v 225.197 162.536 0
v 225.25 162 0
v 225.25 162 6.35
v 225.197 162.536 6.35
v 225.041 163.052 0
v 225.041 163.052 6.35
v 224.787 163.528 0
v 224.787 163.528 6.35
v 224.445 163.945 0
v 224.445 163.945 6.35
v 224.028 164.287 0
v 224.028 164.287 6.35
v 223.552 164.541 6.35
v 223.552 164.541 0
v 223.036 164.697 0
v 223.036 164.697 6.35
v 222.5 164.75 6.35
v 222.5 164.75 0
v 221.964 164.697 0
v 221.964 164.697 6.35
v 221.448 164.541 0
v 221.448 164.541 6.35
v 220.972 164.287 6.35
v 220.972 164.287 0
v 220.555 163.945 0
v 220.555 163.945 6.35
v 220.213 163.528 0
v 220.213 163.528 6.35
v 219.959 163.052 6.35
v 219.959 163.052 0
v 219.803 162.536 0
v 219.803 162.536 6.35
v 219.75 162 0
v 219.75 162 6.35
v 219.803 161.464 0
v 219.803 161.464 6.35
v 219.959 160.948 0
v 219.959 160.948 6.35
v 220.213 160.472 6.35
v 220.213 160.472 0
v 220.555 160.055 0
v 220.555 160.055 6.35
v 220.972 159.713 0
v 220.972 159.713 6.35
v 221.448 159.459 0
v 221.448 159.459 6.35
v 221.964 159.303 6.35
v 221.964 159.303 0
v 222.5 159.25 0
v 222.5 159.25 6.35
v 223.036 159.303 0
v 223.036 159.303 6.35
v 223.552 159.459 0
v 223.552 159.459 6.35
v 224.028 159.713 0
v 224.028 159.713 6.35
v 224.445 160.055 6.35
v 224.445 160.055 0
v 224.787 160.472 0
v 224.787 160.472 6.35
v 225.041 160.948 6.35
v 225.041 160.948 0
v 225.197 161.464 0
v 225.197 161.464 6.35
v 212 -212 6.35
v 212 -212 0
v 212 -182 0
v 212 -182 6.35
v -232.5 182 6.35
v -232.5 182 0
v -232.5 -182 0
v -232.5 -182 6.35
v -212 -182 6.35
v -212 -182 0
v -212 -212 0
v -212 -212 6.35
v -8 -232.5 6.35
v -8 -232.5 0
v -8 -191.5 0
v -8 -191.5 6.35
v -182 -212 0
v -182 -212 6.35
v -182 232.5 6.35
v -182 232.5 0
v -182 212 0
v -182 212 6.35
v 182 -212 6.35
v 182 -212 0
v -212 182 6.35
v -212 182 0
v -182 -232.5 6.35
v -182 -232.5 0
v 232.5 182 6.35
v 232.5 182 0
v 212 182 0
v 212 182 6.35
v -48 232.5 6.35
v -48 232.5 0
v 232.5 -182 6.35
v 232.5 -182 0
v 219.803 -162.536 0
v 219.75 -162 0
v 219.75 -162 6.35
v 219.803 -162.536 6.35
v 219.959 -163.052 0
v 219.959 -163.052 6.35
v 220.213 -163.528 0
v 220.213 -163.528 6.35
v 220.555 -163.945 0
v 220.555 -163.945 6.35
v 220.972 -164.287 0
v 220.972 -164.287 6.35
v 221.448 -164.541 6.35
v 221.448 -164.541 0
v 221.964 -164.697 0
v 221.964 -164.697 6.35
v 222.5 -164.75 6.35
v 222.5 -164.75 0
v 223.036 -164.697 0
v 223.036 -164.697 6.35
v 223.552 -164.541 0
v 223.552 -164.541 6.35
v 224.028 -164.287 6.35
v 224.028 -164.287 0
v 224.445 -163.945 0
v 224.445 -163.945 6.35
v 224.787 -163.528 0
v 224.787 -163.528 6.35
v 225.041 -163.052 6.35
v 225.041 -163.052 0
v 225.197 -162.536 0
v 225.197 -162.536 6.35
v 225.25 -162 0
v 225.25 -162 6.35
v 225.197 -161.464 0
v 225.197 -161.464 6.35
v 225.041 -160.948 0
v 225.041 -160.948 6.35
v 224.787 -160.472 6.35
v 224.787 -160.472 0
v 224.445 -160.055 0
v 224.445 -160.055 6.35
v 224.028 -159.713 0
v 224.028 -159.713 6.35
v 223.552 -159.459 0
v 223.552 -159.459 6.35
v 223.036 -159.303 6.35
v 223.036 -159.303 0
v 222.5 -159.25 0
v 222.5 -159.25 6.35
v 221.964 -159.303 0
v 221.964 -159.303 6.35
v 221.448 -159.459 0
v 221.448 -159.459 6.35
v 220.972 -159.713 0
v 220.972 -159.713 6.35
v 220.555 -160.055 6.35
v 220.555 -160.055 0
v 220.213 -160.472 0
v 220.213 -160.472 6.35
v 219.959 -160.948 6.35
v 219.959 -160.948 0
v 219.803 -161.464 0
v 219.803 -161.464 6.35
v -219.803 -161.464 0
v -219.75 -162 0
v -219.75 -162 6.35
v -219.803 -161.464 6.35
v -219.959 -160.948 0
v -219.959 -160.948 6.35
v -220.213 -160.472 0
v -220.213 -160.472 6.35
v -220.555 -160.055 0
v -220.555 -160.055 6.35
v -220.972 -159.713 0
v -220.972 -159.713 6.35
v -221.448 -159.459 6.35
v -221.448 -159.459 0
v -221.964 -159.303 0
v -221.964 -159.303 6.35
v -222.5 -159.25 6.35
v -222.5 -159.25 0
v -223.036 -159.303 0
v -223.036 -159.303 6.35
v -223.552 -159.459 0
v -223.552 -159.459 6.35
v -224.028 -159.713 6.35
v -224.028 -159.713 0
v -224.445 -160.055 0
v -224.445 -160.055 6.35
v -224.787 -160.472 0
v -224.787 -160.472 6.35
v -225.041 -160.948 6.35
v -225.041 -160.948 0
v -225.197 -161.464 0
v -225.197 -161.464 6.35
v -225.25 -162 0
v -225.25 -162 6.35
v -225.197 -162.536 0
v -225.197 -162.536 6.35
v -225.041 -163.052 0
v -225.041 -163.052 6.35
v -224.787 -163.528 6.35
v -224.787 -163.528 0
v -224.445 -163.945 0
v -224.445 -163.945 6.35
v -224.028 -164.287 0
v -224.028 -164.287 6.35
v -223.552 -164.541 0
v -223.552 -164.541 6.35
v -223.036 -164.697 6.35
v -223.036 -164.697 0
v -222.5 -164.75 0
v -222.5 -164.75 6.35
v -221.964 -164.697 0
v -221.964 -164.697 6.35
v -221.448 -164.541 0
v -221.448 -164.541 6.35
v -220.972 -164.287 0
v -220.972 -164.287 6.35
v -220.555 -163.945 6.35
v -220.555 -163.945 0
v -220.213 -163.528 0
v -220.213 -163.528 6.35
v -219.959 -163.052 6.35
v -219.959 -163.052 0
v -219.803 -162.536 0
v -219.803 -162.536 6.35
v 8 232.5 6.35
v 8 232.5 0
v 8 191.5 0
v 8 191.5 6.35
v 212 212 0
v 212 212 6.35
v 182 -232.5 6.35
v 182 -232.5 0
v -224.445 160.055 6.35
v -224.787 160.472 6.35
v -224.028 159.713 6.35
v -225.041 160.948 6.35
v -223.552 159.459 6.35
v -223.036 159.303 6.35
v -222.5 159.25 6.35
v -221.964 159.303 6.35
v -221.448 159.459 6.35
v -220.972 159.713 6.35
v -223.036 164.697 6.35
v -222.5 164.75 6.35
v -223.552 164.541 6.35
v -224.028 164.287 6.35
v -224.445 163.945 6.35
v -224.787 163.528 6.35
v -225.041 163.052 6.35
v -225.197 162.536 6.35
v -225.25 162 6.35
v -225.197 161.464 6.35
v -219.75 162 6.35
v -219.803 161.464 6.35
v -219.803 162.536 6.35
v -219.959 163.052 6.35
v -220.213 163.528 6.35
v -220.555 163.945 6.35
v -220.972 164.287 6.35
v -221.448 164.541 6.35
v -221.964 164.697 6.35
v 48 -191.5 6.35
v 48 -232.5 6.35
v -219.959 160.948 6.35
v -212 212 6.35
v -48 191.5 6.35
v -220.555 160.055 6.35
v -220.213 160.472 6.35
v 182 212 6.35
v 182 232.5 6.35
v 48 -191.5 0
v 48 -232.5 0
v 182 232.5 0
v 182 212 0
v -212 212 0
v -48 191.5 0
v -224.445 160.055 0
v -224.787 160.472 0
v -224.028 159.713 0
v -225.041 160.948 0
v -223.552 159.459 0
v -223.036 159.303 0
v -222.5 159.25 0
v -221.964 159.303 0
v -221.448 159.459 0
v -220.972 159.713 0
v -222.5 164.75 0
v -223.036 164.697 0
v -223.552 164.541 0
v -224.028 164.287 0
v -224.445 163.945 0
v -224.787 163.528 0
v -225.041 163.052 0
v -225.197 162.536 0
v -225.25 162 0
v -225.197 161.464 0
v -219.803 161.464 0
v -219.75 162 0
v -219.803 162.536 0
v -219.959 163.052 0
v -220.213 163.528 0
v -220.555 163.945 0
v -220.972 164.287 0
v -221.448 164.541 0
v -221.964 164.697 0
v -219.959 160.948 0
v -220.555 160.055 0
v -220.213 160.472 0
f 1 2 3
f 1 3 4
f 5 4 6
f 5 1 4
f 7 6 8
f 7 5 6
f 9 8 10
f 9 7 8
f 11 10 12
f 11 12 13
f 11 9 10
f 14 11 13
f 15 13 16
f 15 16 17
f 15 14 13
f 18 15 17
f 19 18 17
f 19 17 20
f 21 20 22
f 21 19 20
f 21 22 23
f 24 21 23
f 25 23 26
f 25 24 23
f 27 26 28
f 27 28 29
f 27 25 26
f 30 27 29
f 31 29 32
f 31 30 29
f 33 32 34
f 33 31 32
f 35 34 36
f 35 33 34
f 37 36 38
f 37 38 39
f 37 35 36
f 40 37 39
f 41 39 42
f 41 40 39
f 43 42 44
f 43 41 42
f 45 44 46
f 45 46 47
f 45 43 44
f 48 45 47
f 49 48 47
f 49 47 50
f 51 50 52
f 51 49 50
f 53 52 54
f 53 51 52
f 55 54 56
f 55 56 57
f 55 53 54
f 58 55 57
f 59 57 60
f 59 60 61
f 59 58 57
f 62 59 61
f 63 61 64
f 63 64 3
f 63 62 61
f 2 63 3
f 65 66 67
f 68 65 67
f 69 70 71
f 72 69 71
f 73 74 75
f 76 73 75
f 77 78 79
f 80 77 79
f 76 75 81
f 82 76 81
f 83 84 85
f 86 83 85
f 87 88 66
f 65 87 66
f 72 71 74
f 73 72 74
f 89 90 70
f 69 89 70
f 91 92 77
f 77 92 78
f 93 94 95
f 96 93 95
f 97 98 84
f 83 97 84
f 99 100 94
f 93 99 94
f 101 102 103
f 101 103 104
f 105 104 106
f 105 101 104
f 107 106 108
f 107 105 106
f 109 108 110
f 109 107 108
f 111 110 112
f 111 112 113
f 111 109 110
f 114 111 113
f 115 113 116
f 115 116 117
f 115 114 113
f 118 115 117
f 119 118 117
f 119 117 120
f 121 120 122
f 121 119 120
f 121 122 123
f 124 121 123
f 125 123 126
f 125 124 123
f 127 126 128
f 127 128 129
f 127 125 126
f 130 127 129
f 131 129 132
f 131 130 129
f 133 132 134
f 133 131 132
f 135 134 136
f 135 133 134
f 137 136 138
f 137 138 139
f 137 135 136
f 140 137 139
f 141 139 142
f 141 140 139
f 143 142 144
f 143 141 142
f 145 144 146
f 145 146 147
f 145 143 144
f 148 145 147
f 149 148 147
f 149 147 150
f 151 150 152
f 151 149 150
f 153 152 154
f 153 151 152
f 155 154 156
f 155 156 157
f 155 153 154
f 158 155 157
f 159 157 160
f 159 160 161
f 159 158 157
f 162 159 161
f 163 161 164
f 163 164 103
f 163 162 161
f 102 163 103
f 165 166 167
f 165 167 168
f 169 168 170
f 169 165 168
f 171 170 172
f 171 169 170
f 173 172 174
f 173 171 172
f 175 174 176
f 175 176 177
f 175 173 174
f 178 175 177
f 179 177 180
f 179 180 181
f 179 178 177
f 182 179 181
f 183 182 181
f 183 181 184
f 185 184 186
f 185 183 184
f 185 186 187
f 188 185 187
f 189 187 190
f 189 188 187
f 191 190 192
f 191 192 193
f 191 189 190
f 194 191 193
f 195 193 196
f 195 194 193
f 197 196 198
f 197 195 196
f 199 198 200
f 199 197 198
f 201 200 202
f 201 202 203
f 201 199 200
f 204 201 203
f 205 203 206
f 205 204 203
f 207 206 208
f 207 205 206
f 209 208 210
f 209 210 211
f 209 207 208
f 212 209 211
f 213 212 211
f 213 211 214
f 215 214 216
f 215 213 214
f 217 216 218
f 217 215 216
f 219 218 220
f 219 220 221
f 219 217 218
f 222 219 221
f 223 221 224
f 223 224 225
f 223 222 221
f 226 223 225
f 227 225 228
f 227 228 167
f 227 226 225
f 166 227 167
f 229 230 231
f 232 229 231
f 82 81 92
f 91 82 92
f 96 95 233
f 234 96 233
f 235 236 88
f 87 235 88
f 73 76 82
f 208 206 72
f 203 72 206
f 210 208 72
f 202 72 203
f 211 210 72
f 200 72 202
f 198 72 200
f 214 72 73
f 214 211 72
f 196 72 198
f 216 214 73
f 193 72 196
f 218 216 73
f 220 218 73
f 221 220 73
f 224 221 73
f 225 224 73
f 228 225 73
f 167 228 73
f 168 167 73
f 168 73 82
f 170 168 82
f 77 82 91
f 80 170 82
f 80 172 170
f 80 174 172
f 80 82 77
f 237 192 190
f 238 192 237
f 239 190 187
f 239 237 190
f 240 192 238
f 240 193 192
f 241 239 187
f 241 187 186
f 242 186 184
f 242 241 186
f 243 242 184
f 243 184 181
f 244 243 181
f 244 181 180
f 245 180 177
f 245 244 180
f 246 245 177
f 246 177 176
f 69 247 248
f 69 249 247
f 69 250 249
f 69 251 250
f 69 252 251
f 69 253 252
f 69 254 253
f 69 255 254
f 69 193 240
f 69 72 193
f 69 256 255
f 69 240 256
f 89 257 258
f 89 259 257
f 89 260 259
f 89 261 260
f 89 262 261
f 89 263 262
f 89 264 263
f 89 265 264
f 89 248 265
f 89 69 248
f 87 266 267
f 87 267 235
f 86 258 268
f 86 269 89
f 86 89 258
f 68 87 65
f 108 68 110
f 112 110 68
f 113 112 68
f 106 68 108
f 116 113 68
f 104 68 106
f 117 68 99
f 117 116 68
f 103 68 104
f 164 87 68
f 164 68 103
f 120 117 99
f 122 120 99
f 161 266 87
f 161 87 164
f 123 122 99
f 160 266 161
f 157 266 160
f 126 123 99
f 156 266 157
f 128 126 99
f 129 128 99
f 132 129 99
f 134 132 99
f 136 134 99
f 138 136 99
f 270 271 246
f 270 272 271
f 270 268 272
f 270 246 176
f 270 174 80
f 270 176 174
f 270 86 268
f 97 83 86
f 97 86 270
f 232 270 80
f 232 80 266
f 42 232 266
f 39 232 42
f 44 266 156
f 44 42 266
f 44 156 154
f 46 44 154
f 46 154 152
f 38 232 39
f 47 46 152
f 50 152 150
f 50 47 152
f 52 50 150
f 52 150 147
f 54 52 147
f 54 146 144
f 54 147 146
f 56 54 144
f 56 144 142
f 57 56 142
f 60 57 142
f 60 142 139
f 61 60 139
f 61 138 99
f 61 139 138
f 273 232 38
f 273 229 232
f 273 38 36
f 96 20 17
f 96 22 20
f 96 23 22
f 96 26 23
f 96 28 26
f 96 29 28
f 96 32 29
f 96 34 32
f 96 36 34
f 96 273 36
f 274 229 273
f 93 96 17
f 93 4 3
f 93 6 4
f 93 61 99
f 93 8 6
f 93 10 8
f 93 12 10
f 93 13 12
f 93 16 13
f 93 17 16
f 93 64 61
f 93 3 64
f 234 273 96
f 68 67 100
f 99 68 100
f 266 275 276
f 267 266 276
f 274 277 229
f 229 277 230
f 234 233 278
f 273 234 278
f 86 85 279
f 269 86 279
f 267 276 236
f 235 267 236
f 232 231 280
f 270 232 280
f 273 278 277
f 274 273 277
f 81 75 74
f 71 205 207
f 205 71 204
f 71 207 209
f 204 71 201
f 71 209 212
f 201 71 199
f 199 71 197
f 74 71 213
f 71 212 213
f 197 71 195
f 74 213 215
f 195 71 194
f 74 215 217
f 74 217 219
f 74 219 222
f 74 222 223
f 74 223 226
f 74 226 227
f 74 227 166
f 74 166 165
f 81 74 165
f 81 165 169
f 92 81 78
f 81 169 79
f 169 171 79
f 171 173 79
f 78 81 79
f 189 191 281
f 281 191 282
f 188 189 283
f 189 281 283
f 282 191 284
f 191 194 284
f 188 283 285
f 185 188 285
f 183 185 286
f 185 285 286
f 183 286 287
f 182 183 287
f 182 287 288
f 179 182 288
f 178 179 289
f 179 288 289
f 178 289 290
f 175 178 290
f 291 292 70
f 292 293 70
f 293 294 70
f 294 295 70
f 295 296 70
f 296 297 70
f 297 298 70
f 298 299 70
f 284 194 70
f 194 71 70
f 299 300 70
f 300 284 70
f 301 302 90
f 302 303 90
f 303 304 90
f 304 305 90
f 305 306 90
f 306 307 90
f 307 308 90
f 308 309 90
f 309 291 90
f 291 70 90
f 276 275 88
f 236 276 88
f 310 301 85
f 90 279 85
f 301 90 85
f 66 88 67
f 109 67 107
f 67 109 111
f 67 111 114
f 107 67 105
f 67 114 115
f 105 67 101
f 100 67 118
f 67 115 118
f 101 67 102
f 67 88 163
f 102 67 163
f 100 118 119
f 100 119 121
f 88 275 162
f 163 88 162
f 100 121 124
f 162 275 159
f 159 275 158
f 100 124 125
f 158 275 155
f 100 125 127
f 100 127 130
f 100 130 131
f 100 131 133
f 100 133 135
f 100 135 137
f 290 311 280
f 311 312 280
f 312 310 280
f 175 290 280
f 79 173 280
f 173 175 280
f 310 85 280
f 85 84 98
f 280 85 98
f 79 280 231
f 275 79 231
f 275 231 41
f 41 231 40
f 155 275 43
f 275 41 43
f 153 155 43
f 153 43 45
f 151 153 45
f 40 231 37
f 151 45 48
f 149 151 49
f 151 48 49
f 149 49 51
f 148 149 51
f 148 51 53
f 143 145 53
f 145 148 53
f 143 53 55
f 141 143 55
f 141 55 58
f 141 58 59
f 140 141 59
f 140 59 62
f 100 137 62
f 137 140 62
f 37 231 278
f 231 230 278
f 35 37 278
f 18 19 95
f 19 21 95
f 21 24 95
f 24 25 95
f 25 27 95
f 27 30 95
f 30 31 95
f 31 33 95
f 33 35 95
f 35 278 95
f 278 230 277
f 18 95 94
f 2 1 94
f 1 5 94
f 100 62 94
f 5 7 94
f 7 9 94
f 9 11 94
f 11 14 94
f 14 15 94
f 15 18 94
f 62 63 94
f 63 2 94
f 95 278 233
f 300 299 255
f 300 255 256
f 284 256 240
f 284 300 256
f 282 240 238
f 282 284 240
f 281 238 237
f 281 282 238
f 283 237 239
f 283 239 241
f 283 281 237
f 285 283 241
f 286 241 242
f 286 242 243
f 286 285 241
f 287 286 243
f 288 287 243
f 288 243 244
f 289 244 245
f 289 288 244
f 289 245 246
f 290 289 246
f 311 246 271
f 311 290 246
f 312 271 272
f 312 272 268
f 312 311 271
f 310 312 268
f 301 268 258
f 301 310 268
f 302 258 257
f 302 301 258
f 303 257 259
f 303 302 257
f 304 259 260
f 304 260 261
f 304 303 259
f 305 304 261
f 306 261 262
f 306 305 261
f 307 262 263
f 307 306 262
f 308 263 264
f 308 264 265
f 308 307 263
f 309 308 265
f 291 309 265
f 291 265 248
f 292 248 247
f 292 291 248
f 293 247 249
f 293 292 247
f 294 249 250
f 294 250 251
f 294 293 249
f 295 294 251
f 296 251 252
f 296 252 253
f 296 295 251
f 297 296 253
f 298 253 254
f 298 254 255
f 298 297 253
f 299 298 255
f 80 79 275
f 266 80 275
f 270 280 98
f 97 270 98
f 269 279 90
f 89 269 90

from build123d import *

# Parameters (mm, degrees)
SKETCH1_R           = 2.75
BOSS_EXTRUDE1_DEPTH = 6.35


with BuildPart() as part:
    # Sketch1 → Boss-Extrude1 (new body)
    with BuildSketch(Plane.XY):
        Polygon((182, -212), (212, -212), (212, -182), (232.5, -182), (232.5, 0), (232.5, 182), (212, 182), (212, 212), (182, 212), (182, 232.5), (8, 232.5), (8, 191.5), (-48, 191.5), (-48, 232.5), (-182, 232.5), (-182, 212), (-212, 212), (-212, 182), (-232.5, 182), (-232.5, 0), (-232.5, -182), (-212, -182), (-212, -212), (-182, -212), (-182, -232.5), (-8, -232.5), (-8, -191.5), (48, -191.5), (48, -232.5), (182, -232.5), align=None)
        with Locations((-222.5, -162)):
            Circle(SKETCH1_R, mode=Mode.SUBTRACT)
        with Locations(Location((222.5, -162, 0), (0, 0, 180))):
            Circle(SKETCH1_R, mode=Mode.SUBTRACT)
        with Locations((222.5, 162)):
            Circle(SKETCH1_R, mode=Mode.SUBTRACT)
        with Locations(Location((-222.5, 162, 0), (0, 0, 180))):
            Circle(SKETCH1_R, mode=Mode.SUBTRACT)
    extrude(amount=BOSS_EXTRUDE1_DEPTH)


solid = part.part
